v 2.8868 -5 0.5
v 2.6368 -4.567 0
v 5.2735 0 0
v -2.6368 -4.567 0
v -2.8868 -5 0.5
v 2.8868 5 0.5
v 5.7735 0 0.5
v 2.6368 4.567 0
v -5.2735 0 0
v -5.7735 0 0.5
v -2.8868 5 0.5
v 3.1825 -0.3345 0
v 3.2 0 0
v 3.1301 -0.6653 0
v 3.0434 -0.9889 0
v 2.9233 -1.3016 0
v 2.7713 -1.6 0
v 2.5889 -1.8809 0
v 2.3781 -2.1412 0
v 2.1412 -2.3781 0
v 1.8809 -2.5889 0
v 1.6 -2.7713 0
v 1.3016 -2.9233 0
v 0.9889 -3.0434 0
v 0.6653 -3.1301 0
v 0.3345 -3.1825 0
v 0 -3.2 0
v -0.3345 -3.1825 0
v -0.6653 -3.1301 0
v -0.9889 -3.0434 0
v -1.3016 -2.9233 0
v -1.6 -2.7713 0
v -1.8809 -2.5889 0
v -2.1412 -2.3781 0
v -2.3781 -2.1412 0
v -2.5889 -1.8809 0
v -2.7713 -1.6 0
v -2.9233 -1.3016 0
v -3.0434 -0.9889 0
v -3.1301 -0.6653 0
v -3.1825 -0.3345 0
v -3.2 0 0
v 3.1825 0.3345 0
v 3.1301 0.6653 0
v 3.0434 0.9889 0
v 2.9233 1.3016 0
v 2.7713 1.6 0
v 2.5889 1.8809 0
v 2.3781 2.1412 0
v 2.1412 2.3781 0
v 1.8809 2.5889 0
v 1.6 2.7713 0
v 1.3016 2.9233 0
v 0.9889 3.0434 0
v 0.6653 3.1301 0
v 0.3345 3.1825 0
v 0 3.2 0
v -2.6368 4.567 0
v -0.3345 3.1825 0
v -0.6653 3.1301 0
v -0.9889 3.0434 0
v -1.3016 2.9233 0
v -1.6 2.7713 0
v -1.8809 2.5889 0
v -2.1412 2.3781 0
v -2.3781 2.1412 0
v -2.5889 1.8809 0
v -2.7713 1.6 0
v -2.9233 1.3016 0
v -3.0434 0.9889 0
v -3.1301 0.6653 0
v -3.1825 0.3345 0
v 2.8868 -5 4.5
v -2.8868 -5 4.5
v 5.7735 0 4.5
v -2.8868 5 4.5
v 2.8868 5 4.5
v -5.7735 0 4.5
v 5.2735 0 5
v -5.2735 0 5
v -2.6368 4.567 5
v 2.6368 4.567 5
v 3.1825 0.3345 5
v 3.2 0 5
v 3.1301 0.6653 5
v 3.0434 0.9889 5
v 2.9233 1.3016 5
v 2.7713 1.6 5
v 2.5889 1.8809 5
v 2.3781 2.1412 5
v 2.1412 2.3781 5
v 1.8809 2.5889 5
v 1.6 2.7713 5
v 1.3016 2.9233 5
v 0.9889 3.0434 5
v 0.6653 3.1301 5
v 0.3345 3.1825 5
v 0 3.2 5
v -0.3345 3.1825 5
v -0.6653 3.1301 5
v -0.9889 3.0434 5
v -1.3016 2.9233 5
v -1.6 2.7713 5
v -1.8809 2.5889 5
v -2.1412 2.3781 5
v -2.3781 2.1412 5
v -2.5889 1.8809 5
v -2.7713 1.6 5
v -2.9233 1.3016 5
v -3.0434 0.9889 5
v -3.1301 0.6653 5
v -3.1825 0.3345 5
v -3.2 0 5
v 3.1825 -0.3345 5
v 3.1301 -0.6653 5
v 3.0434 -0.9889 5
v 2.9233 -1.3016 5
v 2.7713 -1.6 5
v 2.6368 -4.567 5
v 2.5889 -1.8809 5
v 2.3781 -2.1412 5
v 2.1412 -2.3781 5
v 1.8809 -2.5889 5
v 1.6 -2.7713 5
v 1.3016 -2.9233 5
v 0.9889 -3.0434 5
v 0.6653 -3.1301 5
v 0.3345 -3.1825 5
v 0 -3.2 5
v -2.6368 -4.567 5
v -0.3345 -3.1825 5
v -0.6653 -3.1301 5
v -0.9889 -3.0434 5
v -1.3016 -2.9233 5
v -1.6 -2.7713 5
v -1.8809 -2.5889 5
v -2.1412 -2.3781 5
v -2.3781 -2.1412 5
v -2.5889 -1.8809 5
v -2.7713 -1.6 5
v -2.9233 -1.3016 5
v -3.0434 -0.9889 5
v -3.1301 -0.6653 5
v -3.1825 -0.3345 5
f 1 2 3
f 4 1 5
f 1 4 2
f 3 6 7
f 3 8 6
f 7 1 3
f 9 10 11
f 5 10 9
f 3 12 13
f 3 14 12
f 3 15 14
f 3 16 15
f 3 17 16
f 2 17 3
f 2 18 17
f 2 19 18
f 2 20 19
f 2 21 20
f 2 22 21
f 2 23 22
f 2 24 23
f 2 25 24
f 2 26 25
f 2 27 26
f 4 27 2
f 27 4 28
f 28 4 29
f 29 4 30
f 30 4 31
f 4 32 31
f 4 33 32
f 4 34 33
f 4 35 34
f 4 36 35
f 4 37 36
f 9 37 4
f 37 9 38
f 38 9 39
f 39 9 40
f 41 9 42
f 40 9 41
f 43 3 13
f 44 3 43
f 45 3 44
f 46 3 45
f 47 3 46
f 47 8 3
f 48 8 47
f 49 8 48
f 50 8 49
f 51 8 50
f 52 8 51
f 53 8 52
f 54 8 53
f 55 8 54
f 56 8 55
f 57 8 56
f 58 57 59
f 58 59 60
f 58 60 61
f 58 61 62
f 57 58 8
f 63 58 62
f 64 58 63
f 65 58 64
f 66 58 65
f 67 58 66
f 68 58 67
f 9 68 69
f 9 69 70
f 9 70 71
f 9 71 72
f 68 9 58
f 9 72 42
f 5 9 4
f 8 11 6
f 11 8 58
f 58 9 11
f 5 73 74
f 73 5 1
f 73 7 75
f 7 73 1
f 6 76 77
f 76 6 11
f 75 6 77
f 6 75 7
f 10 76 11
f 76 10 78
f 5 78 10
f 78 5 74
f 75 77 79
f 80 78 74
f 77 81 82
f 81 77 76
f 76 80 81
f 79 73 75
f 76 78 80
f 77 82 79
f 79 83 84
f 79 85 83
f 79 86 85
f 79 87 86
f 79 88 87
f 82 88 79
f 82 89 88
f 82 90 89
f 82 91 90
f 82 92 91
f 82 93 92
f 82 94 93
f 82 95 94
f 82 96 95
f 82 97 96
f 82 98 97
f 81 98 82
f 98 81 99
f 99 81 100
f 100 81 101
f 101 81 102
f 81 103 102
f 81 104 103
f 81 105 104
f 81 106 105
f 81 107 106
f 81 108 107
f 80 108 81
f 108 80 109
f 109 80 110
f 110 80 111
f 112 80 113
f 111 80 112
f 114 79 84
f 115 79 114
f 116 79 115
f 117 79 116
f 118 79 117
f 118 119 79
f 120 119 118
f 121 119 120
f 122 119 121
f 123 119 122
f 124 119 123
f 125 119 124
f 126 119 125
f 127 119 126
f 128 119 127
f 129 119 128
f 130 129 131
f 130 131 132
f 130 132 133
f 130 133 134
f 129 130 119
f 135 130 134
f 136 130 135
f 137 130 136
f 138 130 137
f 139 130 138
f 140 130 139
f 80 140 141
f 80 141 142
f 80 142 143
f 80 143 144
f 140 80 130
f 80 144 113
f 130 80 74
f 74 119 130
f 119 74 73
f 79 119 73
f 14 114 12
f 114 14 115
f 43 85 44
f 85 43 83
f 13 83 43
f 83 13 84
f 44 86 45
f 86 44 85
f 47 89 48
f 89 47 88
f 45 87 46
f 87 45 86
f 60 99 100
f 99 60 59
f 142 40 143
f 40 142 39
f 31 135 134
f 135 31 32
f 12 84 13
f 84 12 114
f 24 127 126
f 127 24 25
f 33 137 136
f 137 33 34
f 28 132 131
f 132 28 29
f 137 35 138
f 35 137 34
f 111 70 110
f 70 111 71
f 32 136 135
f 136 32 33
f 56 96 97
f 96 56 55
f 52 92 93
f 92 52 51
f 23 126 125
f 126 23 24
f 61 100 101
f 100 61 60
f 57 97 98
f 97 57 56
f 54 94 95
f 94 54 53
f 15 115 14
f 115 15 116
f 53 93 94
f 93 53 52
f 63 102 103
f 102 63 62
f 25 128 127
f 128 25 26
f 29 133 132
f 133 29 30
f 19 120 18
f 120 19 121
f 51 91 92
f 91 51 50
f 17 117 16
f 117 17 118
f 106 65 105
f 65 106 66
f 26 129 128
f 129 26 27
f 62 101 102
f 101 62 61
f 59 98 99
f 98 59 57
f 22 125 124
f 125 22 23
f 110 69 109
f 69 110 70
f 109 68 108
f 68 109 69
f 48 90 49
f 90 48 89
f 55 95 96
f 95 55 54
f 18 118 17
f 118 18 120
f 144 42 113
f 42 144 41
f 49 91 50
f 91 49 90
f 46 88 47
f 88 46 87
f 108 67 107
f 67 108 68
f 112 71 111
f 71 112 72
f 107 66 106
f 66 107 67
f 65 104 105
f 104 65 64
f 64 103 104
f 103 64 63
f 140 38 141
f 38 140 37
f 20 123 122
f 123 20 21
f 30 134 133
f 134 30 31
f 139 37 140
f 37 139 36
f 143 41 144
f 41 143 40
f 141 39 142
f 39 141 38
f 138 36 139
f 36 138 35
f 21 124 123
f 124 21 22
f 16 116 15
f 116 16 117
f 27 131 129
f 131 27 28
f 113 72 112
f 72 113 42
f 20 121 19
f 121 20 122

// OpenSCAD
// Through hex nut.
$fn = 60;
eps = 0.02;
thread_clearance_d = 6.4;
flat = 10;
thickness = 5;
chamfer = 0.5;
difference() {
    union() {
        cylinder(d1 = flat / cos(30) - 2 * chamfer, d2 = flat / cos(30), h = chamfer, $fn = 6);
        translate([0, 0, chamfer]) cylinder(d = flat / cos(30), h = thickness - 2 * chamfer, $fn = 6);
        translate([0, 0, thickness - chamfer]) cylinder(d1 = flat / cos(30), d2 = flat / cos(30) - 2 * chamfer, h = chamfer, $fn = 6);
    }
    translate([0, 0, -eps]) cylinder(d = thread_clearance_d, h = thickness + 2 * eps);
}
